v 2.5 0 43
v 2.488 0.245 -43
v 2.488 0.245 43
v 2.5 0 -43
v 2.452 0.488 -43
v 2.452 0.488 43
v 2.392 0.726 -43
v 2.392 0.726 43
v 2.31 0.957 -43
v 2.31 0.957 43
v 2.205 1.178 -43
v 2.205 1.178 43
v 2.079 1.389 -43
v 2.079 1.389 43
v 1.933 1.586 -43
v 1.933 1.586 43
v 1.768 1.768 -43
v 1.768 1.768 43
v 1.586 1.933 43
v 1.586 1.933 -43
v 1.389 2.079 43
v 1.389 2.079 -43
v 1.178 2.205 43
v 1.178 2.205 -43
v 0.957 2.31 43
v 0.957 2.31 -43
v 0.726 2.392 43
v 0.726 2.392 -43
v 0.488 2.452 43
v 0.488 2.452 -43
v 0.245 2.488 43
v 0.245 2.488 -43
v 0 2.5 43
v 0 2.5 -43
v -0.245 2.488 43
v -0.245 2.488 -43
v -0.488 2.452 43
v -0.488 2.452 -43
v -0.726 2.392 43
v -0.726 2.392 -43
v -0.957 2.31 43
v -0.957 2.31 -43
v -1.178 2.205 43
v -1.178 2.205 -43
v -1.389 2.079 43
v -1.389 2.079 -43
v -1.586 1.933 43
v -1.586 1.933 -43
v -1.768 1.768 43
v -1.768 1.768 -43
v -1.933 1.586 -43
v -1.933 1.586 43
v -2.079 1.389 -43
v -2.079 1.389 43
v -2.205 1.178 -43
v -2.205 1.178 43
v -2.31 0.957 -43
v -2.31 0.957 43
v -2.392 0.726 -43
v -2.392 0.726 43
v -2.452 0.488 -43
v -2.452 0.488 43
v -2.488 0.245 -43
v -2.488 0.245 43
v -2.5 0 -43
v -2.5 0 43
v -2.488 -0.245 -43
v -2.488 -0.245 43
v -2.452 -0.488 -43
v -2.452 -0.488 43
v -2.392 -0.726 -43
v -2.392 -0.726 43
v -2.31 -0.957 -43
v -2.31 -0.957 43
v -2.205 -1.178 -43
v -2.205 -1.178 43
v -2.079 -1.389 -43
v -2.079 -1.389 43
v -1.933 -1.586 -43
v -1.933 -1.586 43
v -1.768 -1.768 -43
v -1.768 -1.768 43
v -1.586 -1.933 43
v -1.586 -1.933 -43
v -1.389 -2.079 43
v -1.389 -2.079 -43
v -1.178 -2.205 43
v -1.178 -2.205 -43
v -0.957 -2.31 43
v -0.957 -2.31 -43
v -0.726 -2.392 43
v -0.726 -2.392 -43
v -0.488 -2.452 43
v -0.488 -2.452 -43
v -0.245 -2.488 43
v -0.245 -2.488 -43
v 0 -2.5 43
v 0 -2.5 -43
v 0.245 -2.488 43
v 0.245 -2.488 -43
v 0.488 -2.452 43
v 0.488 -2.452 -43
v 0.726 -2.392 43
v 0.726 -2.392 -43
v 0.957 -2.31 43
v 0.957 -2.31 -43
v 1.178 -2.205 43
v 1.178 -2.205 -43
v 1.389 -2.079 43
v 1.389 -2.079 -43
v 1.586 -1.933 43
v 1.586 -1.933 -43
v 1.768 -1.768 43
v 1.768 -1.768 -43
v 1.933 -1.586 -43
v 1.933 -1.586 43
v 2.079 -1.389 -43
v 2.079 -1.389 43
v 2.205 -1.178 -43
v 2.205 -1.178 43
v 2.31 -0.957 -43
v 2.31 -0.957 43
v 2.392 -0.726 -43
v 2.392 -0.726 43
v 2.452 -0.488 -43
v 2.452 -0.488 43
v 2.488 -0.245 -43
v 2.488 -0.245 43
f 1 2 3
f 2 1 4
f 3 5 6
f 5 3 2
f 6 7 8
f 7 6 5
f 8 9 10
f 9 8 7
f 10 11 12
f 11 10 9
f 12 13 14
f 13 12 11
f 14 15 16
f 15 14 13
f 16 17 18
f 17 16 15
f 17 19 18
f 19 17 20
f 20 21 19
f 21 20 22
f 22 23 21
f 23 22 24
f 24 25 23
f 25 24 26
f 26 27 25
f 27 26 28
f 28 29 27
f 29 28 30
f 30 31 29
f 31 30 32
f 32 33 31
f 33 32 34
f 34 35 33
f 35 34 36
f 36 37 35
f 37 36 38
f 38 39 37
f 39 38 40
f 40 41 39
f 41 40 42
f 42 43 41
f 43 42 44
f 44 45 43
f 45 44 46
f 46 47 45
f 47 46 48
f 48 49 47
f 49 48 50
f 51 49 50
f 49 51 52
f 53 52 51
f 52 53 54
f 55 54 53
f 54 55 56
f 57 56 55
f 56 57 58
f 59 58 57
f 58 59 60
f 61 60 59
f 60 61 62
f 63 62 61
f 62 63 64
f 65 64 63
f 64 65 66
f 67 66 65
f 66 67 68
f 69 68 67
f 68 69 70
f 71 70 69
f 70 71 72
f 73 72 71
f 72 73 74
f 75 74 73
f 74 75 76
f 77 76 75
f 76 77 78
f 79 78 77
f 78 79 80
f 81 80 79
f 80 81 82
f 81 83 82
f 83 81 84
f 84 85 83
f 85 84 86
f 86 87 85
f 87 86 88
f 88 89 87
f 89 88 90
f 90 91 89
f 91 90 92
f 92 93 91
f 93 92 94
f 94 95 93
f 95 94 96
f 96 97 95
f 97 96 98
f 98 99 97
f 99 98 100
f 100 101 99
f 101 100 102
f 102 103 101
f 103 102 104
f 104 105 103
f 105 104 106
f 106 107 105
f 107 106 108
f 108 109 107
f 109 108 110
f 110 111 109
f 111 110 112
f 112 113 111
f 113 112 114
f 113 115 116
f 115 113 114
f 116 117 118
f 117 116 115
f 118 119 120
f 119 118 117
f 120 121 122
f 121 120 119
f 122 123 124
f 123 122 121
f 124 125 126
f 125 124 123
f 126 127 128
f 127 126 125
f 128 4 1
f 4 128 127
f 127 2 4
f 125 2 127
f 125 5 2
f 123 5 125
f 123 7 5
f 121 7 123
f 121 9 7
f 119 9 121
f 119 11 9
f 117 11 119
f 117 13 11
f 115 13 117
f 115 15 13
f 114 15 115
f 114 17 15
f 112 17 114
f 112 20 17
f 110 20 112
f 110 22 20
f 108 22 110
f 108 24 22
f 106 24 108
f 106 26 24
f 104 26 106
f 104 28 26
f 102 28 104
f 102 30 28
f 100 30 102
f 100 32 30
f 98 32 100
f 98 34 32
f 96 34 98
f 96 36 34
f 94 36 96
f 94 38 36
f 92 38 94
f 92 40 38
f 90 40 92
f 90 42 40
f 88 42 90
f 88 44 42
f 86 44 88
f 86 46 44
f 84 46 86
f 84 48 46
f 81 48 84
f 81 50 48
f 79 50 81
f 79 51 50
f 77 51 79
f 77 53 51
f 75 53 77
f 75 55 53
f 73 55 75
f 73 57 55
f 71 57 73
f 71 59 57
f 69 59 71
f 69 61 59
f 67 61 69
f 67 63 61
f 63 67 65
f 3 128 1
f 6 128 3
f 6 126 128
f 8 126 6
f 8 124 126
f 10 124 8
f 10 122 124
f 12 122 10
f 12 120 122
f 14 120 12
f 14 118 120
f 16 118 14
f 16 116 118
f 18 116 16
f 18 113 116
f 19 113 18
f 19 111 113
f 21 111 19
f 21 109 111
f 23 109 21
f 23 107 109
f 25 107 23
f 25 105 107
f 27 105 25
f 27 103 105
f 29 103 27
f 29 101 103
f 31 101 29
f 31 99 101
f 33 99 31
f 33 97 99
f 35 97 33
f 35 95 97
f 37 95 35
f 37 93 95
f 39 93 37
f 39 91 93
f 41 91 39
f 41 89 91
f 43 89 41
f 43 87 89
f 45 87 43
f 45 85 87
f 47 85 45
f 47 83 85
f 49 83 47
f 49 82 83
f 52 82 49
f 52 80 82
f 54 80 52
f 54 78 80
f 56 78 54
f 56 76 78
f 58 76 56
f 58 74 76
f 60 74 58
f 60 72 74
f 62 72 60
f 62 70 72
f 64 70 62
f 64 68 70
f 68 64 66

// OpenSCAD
$fn = 64;
length = 86;
dia = 5.0;

cylinder(h=length, r=dia/2, center=true);
